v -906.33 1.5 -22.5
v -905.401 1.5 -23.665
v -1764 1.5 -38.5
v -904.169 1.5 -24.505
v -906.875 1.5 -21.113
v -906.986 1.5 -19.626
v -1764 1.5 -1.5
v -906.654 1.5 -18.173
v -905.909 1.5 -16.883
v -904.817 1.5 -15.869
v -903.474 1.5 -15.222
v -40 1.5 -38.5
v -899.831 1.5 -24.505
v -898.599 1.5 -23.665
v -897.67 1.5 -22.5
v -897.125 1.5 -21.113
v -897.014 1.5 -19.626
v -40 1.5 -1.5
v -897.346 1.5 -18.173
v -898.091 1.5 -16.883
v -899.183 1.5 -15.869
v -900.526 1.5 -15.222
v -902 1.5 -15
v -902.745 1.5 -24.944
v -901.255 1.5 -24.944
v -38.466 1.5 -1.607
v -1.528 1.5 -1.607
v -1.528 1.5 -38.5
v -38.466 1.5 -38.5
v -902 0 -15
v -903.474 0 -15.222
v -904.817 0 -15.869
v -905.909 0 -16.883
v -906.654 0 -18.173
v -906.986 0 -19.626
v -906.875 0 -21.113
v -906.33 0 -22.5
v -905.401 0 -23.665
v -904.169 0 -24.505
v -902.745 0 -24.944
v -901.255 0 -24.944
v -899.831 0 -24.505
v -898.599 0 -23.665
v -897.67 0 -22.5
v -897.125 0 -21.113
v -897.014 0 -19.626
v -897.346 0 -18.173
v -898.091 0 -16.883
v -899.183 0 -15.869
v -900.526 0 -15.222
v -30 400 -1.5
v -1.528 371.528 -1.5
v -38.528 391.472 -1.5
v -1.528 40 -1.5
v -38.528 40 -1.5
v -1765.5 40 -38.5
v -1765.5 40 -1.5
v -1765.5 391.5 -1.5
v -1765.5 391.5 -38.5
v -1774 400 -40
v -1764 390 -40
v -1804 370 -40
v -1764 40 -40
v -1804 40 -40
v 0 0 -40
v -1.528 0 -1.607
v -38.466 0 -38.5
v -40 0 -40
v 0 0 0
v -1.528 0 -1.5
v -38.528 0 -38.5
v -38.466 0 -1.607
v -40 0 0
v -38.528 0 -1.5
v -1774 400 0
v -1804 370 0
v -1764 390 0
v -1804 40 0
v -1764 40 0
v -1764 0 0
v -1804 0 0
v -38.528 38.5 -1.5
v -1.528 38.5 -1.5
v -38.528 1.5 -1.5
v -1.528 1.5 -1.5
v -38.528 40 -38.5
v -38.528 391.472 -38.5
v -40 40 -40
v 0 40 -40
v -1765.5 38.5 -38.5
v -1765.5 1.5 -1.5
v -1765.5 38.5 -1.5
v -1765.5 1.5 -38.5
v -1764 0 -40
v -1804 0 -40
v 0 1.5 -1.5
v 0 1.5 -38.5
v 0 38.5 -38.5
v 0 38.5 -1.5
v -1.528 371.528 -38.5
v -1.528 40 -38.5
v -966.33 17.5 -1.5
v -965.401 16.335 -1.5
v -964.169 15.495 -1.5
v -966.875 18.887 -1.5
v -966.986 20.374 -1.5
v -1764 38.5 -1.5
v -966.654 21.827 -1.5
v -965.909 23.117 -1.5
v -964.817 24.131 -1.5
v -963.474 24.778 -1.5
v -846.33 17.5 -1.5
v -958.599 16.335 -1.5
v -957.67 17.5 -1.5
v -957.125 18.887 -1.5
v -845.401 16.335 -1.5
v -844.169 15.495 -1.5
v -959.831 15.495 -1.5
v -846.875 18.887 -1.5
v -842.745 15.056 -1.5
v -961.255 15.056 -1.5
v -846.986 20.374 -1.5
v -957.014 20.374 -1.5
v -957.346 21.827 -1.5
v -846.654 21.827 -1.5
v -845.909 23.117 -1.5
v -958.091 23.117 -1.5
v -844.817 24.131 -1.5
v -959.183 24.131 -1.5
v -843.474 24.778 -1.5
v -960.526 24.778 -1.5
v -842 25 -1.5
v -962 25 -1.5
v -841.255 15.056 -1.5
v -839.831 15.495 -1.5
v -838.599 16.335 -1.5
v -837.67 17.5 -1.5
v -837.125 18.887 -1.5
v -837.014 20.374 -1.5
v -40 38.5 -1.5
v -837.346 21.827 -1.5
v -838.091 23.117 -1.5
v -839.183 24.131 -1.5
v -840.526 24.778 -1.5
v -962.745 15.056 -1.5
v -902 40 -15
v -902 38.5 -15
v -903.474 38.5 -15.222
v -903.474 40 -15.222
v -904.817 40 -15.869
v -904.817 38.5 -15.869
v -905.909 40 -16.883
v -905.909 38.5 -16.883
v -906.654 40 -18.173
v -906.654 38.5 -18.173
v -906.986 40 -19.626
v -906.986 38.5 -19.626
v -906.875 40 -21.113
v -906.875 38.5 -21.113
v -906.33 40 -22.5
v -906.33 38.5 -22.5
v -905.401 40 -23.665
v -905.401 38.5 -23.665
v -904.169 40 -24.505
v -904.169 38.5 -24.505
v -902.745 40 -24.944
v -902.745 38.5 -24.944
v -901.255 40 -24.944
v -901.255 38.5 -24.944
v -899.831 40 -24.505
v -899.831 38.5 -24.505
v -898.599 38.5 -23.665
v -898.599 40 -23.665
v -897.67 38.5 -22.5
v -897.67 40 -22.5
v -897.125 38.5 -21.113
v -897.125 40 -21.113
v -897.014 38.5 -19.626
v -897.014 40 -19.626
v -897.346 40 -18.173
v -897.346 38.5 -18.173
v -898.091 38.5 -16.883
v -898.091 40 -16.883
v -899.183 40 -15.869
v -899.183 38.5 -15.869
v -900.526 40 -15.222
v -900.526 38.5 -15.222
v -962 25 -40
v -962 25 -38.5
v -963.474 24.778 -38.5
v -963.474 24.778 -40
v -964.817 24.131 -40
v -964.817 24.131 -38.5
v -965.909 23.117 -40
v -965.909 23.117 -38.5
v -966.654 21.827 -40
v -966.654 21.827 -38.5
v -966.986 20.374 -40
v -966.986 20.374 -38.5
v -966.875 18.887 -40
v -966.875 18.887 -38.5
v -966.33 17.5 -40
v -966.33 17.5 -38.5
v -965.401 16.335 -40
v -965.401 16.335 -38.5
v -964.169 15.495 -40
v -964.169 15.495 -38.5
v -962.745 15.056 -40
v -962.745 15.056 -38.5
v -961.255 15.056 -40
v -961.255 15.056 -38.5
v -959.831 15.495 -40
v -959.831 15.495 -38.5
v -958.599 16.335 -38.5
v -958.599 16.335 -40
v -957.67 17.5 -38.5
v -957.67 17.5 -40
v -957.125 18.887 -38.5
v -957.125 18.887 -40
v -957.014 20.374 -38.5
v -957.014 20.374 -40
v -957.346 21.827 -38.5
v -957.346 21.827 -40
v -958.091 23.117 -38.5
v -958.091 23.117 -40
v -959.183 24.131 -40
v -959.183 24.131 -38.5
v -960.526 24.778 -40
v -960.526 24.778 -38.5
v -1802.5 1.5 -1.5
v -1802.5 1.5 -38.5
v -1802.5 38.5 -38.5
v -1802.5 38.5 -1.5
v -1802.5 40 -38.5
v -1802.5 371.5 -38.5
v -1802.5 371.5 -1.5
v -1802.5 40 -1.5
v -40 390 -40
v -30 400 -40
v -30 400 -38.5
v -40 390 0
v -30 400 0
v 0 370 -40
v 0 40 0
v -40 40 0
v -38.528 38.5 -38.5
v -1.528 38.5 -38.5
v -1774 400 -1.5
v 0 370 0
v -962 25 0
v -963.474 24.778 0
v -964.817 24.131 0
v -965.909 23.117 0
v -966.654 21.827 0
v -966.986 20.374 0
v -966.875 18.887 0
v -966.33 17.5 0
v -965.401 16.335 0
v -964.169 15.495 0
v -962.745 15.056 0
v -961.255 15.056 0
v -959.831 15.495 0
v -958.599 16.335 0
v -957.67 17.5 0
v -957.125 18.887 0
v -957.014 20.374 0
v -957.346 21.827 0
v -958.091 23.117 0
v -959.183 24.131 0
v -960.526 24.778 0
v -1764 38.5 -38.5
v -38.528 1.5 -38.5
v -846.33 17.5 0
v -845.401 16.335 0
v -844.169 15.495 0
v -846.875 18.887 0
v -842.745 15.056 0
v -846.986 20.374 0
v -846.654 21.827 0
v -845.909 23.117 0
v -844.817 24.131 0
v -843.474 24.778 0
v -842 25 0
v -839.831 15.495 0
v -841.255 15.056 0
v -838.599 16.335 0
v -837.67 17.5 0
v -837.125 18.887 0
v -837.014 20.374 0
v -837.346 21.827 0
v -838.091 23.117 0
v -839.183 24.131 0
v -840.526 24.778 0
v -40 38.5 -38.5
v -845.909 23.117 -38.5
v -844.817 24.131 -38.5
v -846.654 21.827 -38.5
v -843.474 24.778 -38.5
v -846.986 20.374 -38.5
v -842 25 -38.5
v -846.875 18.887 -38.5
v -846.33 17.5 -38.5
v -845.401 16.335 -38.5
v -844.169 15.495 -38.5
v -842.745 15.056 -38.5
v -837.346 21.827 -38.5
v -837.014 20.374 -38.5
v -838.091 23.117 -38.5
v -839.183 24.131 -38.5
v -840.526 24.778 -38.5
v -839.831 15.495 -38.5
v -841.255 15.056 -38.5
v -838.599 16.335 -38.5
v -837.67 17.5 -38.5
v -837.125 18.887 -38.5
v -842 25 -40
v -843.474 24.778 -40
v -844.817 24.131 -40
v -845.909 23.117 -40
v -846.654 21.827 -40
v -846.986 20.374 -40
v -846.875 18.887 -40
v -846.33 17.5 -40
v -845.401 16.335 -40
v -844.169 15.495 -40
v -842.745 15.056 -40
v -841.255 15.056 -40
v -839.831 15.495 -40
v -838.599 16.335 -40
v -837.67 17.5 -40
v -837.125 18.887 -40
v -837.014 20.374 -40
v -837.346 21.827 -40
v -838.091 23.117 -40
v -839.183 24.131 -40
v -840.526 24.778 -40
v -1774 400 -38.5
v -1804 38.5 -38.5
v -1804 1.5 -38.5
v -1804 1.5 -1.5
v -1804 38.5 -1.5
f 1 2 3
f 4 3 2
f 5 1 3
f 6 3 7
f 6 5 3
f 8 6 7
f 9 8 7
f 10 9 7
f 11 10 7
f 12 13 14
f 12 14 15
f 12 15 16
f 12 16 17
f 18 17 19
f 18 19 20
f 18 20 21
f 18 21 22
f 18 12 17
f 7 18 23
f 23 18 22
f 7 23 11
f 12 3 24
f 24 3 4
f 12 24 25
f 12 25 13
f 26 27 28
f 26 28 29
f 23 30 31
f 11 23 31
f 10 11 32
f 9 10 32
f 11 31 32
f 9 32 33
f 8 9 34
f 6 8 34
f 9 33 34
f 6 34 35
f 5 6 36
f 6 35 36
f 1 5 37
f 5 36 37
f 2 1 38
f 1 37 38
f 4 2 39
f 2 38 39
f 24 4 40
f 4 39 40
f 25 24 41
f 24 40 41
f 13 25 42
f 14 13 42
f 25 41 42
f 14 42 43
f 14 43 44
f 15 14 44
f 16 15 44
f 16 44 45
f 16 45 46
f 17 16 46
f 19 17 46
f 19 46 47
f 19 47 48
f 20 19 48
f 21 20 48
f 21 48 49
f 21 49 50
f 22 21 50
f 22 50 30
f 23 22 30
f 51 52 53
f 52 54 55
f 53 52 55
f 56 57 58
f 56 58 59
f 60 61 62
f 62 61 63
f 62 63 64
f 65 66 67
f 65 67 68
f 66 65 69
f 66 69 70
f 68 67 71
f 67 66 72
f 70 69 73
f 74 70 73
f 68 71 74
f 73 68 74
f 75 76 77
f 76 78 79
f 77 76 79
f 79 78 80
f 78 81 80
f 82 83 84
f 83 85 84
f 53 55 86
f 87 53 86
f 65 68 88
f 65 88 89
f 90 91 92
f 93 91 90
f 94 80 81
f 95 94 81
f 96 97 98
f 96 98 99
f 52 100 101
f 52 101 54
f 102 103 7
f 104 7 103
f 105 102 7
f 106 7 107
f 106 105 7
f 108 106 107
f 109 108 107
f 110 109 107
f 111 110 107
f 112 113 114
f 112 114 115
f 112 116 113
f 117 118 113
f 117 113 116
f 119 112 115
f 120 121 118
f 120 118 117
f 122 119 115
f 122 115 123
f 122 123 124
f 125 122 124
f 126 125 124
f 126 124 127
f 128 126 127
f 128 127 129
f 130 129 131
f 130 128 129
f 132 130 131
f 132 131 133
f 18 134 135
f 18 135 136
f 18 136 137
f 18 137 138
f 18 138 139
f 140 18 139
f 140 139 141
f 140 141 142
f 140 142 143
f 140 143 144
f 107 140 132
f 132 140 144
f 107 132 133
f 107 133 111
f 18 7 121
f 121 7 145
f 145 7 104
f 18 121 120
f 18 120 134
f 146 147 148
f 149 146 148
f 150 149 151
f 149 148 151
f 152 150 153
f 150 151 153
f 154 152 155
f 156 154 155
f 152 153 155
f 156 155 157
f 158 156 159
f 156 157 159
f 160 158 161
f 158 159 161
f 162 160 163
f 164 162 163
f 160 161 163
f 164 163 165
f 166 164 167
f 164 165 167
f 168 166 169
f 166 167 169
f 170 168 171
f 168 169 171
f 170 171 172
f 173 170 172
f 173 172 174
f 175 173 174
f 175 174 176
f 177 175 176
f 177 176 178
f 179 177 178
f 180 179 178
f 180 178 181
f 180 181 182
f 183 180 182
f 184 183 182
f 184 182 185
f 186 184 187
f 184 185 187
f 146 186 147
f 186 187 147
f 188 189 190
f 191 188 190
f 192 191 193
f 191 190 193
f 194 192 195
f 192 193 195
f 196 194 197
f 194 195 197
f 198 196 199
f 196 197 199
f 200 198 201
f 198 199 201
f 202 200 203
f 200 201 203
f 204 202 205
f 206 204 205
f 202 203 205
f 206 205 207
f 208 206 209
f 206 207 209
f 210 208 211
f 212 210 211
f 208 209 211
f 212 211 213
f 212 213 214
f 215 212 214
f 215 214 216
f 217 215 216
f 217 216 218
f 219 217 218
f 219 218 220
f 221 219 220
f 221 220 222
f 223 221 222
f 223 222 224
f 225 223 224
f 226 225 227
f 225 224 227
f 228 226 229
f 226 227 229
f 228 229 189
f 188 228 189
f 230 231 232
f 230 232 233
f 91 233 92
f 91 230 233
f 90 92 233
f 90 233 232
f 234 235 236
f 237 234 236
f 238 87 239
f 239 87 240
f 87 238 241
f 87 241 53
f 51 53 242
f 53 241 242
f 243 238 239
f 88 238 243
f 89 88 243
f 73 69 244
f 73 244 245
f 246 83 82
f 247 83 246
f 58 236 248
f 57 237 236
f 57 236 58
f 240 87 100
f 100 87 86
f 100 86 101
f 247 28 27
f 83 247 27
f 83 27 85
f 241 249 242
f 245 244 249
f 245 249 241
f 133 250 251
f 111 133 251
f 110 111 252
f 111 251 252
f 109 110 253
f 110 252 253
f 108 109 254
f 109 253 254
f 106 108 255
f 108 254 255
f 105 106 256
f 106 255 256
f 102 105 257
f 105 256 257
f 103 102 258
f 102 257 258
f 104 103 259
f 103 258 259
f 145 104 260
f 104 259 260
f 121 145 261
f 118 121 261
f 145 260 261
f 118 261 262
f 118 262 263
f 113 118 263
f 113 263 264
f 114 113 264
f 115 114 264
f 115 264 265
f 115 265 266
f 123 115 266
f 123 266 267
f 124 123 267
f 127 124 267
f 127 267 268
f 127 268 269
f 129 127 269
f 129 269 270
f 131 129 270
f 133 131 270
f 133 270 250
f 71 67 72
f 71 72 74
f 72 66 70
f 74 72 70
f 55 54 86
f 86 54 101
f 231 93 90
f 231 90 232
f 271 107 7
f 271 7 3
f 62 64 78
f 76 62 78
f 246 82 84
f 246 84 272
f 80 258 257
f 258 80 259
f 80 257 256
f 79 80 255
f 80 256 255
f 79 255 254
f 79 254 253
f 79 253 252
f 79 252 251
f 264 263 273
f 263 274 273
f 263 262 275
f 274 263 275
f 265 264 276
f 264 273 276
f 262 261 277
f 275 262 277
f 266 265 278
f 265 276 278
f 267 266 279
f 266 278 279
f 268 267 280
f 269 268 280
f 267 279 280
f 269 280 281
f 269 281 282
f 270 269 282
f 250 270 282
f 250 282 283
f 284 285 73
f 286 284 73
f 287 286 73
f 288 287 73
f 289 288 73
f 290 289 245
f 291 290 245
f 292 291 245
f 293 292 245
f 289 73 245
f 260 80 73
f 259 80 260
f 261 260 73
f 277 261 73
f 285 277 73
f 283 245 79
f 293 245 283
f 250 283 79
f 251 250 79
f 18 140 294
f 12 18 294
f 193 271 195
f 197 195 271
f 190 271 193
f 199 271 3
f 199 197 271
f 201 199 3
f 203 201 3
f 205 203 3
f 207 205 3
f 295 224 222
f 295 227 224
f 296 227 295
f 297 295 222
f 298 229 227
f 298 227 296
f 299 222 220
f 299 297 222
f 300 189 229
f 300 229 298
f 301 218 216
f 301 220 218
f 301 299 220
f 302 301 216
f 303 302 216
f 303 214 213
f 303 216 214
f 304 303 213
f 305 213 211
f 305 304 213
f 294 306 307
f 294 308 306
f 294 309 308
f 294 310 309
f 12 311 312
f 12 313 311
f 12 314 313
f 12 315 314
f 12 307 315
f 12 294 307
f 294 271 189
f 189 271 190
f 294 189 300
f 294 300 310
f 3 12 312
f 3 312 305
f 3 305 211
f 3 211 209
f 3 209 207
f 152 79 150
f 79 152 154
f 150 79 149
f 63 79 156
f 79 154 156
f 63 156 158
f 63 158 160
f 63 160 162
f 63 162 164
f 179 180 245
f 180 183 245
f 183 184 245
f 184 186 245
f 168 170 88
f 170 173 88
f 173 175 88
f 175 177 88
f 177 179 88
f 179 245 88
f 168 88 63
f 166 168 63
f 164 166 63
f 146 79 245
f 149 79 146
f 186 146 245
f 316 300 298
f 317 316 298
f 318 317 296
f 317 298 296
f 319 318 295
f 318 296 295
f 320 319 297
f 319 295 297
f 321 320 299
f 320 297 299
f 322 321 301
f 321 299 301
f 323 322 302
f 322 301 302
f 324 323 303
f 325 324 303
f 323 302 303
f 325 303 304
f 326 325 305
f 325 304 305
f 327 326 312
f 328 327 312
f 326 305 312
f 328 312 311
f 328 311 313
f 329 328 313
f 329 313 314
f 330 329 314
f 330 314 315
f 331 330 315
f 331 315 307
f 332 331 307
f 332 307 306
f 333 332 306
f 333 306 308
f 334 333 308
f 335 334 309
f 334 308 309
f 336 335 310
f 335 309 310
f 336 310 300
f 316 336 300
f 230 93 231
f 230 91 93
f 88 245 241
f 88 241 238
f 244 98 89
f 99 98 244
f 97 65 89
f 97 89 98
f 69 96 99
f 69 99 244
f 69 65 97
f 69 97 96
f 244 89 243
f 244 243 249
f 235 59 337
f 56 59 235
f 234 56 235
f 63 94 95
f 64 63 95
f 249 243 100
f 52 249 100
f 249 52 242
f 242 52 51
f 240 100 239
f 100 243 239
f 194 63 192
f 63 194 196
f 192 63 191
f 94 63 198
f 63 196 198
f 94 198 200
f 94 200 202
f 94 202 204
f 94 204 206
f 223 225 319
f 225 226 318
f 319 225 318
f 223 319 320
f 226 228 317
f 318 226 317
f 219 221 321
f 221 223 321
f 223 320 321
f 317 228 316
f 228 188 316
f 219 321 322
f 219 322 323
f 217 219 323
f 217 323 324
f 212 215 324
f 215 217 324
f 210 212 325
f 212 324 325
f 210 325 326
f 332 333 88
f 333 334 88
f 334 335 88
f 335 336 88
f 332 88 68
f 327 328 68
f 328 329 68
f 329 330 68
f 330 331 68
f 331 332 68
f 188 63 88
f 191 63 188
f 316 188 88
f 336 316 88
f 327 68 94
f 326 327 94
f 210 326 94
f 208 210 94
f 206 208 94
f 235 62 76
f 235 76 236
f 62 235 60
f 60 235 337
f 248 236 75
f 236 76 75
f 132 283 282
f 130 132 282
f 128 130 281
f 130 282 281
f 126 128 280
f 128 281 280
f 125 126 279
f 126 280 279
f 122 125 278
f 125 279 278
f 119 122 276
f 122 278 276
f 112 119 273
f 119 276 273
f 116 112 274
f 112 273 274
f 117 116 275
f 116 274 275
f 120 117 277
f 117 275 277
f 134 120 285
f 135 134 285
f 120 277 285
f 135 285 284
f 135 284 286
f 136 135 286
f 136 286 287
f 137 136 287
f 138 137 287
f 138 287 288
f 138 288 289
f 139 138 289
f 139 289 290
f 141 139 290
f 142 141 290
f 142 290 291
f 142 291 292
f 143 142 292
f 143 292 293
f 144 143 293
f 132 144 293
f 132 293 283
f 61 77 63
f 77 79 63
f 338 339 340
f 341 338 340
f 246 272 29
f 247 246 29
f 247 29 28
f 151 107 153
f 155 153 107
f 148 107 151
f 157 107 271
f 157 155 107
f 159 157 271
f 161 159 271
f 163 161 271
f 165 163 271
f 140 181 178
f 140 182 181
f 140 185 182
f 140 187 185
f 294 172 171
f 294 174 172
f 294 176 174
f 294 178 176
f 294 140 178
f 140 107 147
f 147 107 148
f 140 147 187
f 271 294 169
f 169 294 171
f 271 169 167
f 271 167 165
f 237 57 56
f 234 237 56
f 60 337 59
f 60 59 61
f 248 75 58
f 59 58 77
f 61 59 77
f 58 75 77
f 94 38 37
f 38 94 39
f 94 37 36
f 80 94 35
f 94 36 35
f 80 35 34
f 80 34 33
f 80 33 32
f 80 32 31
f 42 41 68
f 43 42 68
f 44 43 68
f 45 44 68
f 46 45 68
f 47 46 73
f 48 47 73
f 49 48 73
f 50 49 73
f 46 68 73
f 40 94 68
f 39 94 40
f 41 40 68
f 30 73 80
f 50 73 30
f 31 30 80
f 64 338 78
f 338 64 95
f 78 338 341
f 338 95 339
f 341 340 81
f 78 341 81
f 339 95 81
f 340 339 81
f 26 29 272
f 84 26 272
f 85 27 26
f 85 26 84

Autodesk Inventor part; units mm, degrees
ref_plane "YZ Plane" through (0, 0, 0) normal (1, 0, 0) x (0, 1, 0)
ref_plane "XZ Plane" through (0, 0, 0) normal (0, 1, 0) x (-1, 0, 0)
ref_plane "XY Plane" through (0, 0, 0) normal (0, 0, 1) x (1, 0, 0)
sketch "Esboço1" plane through (0, 0, 0) normal (0, 1, 0) x (-1, 0, 0)
  line L0 (0, 0) -> (40, 0)
  line L1 (40, 0) -> (40, -40)
  line L2 (40, -40) -> (0, -40)
  line L3 (0, -40) -> (0, 0)
  line L4 (0, 0) -> (1.5, 0)
  line L5 (1.5283, -1.4997) -> (38.5283, -1.4997)
  line L6 (38.5283, -1.4997) -> (38.5283, -38.4997)
  line L7 (38.5283, -38.4997) -> (1.5283, -38.4997)
  line L8 (1.5283, -38.4997) -> (1.5283, -1.4997)
  line L9 (1804, 0) -> (1764, 0)
  line L10 (1764, 0) -> (1764, -40)
  line L11 (1764, -40) -> (1804, -40)
  line L12 (1804, -40) -> (1804, 0)
  line L13 (1804, 0) -> (1802.5, 0)
  line L14 (1804, -1.4997) -> (1804, 0)
  line L15 (1802.5, -1.4997) -> (1765.5, -1.4997)
  line L16 (1765.5, -1.4997) -> (1765.5, -38.4997)
  line L17 (1765.5, -38.4997) -> (1802.5, -38.4997)
  line L18 (1802.5, -38.4997) -> (1802.5, -1.4997)
  line L19 (38.5283, -1.4997) -> (1.5283, -1.4997)
  line L20 (1.5283, -1.4997) -> (1.5283, -38.4997)
  line L21 (1.5283, -38.4997) -> (38.5283, -38.4997)
  line L22 (38.5283, -38.4997) -> (38.5283, -1.4997)
  dimension "d0" = 40
  dimension "d1" = 40
  dimension "d2" = 1.5
  dimension "d3" = 1.5
  dimension "d4" = 37
  dimension "d5" = 37
  dimension "d6" = 1804
  dimension "d8" = 40
  dimension "d9" = 40
  dimension "d10" = 1.5
  dimension "d11" = 37
  dimension "d12" = 37
  dimension "d15" = 37
  dimension "d16" = 37
extrude "Extrusão1" add sketch "Esboço1" along normal blind 400
sketch "Esboço2" plane through (0, 0, 0) normal (0, 1, 0) x (-1, 0, 0)
  line L0 (38.4659, -1.6068) -> (1.4659, -1.6068)
  line L1 (1.4659, -1.6068) -> (1.4659, -38.6068)
  line L2 (1.4659, -38.6068) -> (38.4659, -38.6068)
  line L3 (38.4659, -38.6068) -> (38.4659, -1.6068)
  point P0 (0, 0)
  dimension "d17" = 37
  dimension "d18" = 37
extrude "Extrusão2" add sketch "Esboço2" along normal blind 1.5
sketch "Esboço3" plane through (0, 0, 0) normal (0, 1, 0) x (-1, 0, 0)
  line L0 (1802.5, -38.4997) -> (1765.5, -38.4997) projected
  line L1 (1765.5, -38.4997) -> (1765.5, -1.4997) projected
  line L2 (1802.5, -38.4997) -> (1765.5, -38.4997)
  line L3 (1765.5, -38.4997) -> (1765.5, -1.4997)
  line L4 (1765.5, -1.4997) -> (1802.5, -1.4997)
  line L5 (1802.5, -1.4997) -> (1802.5, -38.4997)
  point P0 (0, 0)
extrude "Extrusão3" add sketch "Esboço3" along normal blind 1.5
sketch "Esboço4" plane through (0, 0, 0) normal (0, 0, 1) x (1, 0, 0)
  line L0 (-40, 0) -> (-40, 400) projected
  line L1 (-40, 0) -> (-1764, 0)
  line L2 (-1764, 0) -> (-1764, 44.8822)
  line L3 (-40, 44.8822) -> (-40, 0)
  line L4 (-1764, 0) -> (-40, 0)
  line L5 (-40, 0) -> (-40, 40)
  line L6 (-40, 40) -> (-1764, 40)
  line L7 (-1764, 40) -> (-1764, 0)
  point P0 (0, 0)
  dimension "d23" = 1724
  dimension "d24" = 1724
  dimension "d25" = 40
sketch "Esboço7" plane through (0, 0, 0) normal (1, 0, 0) x (0, 1, 0)
  line L0 (0, 0) -> (1.5, 0)
  line L1 (1.5, 0) -> (1.5, -1.5)
  line L2 (1.5, -1.5) -> (0, -1.5)
  line L3 (0, -1.5) -> (0, 0)
  line L4 (1.5, -1.4997) -> (400, -1.4997) projected
  line L5 (1.5, -1.4997) -> (38.5, -1.4997)
  line L6 (38.5, -1.4997) -> (38.5, -38.4997)
  line L7 (38.5, -38.4997) -> (1.5, -38.4997)
  line L8 (1.5, -38.4997) -> (1.5, -1.4997)
  line L9 (0, 0) -> (400, 0) projected
  line L10 (0, 0) -> (40, 0)
  line L11 (40, 0) -> (40, -40)
  line L12 (40, -40) -> (0, -40)
  line L13 (0, -40) -> (0, 0)
  dimension "d44" = 1.5
  dimension "d45" = 1.5
  dimension "d46" = 37
  dimension "d47" = 37
  dimension "d48" = 40
  dimension "d49" = 40
extrude "Extrusão6" add sketch "Esboço7" against normal blind 1804 contours L0 L1 L2 L3 | L9 L11 L4 L1 | L2 L8 L7 L6 L4 L11 L12 L13
sketch "Esboço9" plane through (0, 0, -40) normal (0, 0, -1) x (-1, 0, 0)
  line L0 (40, 40) -> (1764, 40) projected
  line L1 (0, 0) -> (0, 400) projected
  point P0 (842, 20)
  point P1 (962, 20)
  point P2 (0, 373)
  dimension "d87" = 20
  dimension "d88" = 20
  dimension "d89" = 120
  dimension "d90" = 842
hole "Furo2" at (-842, 20, -40) at (-962, 20, -40) direction (0, 0, 1) diameter 10 depth 200
sketch "Esboço10" plane through (-1764, 40, -40) normal (0, 1, 0) x (1, 0, 0)
  line L0 (1764, -40) -> (1764, 0) projected
  line L1 (1724, -40) -> (0, -40) projected
  point P0 (862, -20)
  dimension "d98" = 902
  dimension "d99" = 20
hole "Furo3" at (-902, 40, -20) direction (0, -1, 0) diameter 10 depth 200
chamfer "Chanfro8" distance 30 angle 45 1 edges at (0, 400, -20)
chamfer "Chanfro9" distance 10 angle 45 1 edges at (-40, 400, -20)
chamfer "Chanfro10" distance 10 angle 45 1 edges at (-1764, 400, -20)
chamfer "Chanfro11" distance 30 angle 45 1 edges at (-1804, 400, -20)
properties part number "Base_Fundo_Suporte_Lamina"
